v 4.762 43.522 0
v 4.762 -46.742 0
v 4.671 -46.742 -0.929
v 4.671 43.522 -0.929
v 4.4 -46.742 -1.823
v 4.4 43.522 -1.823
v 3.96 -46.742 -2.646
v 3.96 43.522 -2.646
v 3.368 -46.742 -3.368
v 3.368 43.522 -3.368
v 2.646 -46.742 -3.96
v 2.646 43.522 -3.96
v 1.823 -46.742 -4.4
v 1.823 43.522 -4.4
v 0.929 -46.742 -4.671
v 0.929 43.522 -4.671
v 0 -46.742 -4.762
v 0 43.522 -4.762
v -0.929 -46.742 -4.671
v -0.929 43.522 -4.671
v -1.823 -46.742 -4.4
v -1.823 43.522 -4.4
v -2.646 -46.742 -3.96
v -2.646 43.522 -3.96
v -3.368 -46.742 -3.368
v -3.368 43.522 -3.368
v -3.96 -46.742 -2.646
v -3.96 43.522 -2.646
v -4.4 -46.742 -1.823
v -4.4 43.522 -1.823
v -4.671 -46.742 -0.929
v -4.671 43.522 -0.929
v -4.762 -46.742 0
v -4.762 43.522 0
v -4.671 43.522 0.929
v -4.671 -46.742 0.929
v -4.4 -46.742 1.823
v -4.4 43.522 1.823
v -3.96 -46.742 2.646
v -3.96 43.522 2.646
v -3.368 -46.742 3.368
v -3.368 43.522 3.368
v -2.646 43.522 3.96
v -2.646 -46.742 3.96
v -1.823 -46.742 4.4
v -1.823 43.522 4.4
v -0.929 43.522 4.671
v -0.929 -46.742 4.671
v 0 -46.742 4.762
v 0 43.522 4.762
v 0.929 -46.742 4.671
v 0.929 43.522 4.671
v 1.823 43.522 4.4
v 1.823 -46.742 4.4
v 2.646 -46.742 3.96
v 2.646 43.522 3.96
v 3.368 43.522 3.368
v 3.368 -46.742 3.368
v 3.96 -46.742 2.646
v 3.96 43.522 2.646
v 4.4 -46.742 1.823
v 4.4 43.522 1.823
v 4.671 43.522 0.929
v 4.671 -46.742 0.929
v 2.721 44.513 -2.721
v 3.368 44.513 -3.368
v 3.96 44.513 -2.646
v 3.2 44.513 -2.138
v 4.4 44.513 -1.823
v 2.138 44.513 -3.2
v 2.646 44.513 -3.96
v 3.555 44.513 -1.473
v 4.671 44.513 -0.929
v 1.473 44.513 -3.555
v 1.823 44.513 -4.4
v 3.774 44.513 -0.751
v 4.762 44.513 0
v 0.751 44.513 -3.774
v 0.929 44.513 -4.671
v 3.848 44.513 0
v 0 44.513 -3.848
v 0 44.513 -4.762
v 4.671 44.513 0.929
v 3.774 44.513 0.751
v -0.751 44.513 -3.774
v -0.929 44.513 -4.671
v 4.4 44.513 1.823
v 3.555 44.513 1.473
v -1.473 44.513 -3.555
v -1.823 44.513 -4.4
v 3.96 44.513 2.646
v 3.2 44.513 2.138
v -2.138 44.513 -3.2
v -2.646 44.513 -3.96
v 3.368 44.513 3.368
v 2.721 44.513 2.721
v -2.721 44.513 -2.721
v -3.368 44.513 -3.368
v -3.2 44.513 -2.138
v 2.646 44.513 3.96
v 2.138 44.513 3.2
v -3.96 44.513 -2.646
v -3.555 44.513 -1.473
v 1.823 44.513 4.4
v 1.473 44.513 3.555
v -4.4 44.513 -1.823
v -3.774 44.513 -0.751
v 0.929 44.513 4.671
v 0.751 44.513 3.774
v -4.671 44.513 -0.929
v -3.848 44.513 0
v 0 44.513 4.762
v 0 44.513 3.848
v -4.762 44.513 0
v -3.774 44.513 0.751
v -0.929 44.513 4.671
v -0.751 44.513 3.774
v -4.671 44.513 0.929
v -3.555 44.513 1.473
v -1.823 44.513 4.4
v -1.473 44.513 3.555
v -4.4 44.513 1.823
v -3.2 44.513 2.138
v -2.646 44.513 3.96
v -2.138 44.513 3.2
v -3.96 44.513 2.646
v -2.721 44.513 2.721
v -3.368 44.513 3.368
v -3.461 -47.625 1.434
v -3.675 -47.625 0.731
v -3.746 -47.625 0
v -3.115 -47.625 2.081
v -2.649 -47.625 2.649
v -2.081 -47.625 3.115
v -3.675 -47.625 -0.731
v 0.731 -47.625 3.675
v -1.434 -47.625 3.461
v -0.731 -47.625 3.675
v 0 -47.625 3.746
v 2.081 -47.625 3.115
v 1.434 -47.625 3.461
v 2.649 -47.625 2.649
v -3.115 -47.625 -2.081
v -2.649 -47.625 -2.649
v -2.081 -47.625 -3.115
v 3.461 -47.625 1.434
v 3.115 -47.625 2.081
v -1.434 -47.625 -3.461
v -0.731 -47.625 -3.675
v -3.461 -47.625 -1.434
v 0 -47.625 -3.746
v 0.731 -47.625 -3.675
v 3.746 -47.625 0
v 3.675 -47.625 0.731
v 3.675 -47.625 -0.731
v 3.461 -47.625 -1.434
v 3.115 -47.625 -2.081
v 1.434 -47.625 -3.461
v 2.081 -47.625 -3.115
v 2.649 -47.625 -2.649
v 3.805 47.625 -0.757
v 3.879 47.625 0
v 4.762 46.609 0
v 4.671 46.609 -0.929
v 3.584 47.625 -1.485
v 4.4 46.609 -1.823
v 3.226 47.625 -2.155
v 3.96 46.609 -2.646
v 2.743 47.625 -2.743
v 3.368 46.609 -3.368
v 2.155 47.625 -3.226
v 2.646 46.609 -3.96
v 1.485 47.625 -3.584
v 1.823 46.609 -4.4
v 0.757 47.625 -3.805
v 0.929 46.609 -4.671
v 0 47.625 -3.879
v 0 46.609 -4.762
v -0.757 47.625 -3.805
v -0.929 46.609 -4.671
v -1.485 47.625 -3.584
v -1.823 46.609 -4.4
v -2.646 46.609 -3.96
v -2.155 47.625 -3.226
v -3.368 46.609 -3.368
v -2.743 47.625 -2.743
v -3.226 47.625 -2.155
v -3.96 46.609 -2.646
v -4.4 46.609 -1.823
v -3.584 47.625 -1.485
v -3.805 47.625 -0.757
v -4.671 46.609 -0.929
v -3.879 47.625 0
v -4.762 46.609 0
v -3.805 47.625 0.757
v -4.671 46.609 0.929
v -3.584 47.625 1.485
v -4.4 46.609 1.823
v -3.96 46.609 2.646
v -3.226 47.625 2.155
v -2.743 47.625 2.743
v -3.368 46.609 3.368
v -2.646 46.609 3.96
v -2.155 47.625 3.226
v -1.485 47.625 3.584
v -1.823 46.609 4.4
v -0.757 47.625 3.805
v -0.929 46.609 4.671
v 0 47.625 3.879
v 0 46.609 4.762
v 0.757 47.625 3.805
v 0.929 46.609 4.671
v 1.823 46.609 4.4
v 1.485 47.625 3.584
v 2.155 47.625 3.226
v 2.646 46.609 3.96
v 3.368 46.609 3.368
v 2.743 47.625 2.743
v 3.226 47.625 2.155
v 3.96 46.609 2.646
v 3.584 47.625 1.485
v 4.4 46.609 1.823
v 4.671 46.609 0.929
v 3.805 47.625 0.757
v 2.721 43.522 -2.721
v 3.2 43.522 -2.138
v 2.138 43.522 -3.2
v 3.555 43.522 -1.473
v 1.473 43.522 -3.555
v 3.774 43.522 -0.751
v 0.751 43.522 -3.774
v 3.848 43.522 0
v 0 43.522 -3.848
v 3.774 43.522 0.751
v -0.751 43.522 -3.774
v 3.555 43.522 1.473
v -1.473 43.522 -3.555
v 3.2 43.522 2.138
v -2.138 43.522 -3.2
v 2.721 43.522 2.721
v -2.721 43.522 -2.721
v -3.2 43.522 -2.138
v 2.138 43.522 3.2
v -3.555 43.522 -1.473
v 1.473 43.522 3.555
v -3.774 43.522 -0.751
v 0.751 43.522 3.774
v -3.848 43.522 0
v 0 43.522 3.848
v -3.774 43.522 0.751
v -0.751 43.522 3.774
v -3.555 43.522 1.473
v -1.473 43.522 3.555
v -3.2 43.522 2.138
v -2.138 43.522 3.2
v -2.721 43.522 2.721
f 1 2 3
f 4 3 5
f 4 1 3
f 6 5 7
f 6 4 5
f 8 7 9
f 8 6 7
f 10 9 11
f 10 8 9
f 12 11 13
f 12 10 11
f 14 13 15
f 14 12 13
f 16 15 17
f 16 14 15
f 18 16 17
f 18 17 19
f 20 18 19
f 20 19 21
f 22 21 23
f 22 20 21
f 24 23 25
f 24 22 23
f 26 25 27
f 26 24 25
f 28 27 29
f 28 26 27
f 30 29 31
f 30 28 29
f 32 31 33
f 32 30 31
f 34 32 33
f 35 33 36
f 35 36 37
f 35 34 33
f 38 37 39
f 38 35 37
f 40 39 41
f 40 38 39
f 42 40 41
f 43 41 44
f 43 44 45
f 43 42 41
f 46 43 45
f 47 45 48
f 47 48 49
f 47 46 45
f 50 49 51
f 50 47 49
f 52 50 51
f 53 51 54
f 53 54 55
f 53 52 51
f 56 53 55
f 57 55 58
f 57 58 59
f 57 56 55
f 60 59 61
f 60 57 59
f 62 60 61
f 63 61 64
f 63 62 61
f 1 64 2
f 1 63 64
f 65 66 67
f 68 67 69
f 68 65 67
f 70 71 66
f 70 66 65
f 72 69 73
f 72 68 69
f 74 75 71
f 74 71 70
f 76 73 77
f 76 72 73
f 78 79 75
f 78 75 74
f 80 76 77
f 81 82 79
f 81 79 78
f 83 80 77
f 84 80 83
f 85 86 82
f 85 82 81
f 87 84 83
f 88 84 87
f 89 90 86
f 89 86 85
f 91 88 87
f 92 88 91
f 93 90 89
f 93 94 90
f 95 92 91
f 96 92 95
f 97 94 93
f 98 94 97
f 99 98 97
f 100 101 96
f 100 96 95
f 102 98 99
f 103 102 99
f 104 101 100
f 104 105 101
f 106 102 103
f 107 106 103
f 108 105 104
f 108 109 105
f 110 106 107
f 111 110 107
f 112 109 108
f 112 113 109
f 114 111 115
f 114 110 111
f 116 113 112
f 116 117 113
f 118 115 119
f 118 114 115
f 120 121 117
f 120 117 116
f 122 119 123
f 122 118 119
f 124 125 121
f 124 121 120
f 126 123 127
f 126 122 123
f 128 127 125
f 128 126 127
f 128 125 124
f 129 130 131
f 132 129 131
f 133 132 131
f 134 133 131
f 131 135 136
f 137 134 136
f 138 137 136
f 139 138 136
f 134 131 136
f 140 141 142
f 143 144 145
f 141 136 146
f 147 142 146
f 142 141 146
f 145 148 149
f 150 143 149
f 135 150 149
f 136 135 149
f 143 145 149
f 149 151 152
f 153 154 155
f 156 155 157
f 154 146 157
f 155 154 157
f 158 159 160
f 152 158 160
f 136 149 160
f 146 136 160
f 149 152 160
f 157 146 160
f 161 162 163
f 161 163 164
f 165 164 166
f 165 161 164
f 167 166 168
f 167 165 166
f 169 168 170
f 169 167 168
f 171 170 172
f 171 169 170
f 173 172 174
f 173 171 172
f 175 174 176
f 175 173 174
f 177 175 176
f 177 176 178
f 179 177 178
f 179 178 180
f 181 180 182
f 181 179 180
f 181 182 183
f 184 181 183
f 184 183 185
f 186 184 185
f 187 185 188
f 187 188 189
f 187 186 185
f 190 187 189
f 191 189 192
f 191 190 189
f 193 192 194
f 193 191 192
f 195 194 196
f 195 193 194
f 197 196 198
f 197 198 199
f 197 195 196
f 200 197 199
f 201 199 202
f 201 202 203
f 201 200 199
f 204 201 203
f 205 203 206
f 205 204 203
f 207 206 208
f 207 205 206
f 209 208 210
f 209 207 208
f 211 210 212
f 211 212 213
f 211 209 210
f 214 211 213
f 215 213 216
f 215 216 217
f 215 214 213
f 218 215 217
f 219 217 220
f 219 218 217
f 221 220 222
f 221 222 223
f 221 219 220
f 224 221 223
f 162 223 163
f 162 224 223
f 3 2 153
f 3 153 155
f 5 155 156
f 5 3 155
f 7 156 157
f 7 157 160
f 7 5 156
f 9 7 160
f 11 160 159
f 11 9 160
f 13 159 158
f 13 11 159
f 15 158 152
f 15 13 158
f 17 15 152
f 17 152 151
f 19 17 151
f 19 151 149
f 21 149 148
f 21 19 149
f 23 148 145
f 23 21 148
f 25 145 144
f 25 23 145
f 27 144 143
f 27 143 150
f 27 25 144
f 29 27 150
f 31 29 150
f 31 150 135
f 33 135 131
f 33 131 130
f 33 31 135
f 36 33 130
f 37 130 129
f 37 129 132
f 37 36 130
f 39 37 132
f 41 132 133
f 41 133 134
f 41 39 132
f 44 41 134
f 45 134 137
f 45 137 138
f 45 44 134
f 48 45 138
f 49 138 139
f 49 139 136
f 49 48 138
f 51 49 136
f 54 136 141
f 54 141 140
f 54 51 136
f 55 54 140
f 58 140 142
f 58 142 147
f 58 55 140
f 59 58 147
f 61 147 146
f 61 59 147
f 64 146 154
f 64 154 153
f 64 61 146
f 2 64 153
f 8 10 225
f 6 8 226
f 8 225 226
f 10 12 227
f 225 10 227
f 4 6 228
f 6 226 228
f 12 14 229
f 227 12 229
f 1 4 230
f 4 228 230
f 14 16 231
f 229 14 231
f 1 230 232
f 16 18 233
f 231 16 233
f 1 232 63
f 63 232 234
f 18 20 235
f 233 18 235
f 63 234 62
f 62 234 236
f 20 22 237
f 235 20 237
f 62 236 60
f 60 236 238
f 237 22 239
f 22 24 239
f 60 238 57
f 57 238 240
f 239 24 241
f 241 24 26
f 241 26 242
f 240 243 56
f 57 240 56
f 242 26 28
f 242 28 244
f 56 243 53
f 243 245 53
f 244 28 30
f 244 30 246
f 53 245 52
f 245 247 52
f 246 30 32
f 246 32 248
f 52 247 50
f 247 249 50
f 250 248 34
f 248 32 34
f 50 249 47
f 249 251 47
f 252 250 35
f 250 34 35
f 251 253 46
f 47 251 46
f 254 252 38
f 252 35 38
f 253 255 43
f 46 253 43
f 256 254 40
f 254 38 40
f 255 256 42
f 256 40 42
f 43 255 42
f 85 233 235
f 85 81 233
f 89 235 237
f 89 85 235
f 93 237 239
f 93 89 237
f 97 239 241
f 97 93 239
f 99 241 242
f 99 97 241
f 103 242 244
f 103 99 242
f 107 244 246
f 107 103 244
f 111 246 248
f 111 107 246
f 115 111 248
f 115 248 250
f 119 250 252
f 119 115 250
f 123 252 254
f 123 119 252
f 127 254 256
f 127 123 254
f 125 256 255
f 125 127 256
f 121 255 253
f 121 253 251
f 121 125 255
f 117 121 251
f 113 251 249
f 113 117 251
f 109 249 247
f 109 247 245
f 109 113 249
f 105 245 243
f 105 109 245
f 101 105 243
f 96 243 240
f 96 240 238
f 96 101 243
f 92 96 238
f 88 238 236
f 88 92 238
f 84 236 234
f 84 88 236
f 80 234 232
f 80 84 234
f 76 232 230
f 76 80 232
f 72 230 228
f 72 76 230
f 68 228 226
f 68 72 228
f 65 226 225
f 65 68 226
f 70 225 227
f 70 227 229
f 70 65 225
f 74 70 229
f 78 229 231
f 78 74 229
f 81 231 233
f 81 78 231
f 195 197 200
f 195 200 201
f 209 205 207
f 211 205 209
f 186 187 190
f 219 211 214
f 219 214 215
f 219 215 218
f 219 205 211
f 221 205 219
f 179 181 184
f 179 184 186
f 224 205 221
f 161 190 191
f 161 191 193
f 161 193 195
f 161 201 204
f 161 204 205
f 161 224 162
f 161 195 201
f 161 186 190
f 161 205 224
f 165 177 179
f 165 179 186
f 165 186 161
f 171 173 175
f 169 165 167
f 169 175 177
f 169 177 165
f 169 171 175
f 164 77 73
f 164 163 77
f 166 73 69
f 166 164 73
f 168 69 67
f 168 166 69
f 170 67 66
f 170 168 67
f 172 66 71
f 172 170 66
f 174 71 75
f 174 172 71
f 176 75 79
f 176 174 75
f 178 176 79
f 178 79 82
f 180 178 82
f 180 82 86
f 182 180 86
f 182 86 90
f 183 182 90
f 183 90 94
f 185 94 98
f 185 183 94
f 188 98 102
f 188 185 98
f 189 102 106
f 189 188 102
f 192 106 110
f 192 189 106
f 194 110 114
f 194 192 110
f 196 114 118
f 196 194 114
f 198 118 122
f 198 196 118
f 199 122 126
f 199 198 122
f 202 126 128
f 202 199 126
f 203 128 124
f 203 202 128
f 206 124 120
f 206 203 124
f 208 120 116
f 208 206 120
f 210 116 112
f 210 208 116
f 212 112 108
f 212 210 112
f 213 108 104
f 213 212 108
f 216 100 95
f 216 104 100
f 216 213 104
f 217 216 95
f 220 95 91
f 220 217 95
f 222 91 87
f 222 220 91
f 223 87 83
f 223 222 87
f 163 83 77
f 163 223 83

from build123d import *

# Parameters (mm, degrees)
SKETCH1_R             = 4.7625
BOSS_EXTRUDE1_DEPTH   = 47.625
CHAMFER1_SIZE         = 1.016
CHAMFER1_SIZE2        = 0.883195326
CHAMFER1_PART_2_SIZE  = 1.016
CHAMFER1_PART_2_SIZE2 = 0.883195326
SKETCH3_W             = 0.9144
SKETCH3_H             = 0.9906


with BuildPart() as part:
    # Sketch1 → Boss-Extrude1 (new body, symmetric)
    with BuildSketch(Plane(origin=(0, 0, 0), x_dir=(1, 0, 0), z_dir=(0, 1, 0))):
        Circle(SKETCH1_R)
    extrude(amount=BOSS_EXTRUDE1_DEPTH, both=True)

    # Chamfer1
    chamfer1_edges = [part.edges().sort_by_distance(p)[0] for p in [
        (-4.7625, -47.625, 0),
    ]]
    chamfer1_side = [part.faces().sort_by_distance(p)[0] for p in [
        (0, -47.625, 0),
    ]]
    chamfer(chamfer1_edges, length=CHAMFER1_SIZE, length2=CHAMFER1_SIZE2, reference=chamfer1_side[0])

    # Chamfer1 part 2
    chamfer1_part_2_edges = [part.edges().sort_by_distance(p)[0] for p in [
        (-4.7625, 47.625, 0),
    ]]
    chamfer1_part_2_side = [part.faces().sort_by_distance(p)[0] for p in [
        (-4.7625, 0, 0),
    ]]
    chamfer(chamfer1_part_2_edges, length=CHAMFER1_PART_2_SIZE, length2=CHAMFER1_PART_2_SIZE2, reference=chamfer1_part_2_side[0])

    # Sketch3 → Cut-Revolve1 (revolve, cut)
    with BuildSketch(Plane(origin=(0, 0, 0), x_dir=(0, 0, -1), z_dir=(1, 0, 0))):
        with Locations((4.3053, 44.017653665)):
            Rectangle(SKETCH3_W, SKETCH3_H)
    revolve(axis=Axis((0, -47.820758339, 0), (0, 1, 0)), mode=Mode.SUBTRACT)


solid = part.part
